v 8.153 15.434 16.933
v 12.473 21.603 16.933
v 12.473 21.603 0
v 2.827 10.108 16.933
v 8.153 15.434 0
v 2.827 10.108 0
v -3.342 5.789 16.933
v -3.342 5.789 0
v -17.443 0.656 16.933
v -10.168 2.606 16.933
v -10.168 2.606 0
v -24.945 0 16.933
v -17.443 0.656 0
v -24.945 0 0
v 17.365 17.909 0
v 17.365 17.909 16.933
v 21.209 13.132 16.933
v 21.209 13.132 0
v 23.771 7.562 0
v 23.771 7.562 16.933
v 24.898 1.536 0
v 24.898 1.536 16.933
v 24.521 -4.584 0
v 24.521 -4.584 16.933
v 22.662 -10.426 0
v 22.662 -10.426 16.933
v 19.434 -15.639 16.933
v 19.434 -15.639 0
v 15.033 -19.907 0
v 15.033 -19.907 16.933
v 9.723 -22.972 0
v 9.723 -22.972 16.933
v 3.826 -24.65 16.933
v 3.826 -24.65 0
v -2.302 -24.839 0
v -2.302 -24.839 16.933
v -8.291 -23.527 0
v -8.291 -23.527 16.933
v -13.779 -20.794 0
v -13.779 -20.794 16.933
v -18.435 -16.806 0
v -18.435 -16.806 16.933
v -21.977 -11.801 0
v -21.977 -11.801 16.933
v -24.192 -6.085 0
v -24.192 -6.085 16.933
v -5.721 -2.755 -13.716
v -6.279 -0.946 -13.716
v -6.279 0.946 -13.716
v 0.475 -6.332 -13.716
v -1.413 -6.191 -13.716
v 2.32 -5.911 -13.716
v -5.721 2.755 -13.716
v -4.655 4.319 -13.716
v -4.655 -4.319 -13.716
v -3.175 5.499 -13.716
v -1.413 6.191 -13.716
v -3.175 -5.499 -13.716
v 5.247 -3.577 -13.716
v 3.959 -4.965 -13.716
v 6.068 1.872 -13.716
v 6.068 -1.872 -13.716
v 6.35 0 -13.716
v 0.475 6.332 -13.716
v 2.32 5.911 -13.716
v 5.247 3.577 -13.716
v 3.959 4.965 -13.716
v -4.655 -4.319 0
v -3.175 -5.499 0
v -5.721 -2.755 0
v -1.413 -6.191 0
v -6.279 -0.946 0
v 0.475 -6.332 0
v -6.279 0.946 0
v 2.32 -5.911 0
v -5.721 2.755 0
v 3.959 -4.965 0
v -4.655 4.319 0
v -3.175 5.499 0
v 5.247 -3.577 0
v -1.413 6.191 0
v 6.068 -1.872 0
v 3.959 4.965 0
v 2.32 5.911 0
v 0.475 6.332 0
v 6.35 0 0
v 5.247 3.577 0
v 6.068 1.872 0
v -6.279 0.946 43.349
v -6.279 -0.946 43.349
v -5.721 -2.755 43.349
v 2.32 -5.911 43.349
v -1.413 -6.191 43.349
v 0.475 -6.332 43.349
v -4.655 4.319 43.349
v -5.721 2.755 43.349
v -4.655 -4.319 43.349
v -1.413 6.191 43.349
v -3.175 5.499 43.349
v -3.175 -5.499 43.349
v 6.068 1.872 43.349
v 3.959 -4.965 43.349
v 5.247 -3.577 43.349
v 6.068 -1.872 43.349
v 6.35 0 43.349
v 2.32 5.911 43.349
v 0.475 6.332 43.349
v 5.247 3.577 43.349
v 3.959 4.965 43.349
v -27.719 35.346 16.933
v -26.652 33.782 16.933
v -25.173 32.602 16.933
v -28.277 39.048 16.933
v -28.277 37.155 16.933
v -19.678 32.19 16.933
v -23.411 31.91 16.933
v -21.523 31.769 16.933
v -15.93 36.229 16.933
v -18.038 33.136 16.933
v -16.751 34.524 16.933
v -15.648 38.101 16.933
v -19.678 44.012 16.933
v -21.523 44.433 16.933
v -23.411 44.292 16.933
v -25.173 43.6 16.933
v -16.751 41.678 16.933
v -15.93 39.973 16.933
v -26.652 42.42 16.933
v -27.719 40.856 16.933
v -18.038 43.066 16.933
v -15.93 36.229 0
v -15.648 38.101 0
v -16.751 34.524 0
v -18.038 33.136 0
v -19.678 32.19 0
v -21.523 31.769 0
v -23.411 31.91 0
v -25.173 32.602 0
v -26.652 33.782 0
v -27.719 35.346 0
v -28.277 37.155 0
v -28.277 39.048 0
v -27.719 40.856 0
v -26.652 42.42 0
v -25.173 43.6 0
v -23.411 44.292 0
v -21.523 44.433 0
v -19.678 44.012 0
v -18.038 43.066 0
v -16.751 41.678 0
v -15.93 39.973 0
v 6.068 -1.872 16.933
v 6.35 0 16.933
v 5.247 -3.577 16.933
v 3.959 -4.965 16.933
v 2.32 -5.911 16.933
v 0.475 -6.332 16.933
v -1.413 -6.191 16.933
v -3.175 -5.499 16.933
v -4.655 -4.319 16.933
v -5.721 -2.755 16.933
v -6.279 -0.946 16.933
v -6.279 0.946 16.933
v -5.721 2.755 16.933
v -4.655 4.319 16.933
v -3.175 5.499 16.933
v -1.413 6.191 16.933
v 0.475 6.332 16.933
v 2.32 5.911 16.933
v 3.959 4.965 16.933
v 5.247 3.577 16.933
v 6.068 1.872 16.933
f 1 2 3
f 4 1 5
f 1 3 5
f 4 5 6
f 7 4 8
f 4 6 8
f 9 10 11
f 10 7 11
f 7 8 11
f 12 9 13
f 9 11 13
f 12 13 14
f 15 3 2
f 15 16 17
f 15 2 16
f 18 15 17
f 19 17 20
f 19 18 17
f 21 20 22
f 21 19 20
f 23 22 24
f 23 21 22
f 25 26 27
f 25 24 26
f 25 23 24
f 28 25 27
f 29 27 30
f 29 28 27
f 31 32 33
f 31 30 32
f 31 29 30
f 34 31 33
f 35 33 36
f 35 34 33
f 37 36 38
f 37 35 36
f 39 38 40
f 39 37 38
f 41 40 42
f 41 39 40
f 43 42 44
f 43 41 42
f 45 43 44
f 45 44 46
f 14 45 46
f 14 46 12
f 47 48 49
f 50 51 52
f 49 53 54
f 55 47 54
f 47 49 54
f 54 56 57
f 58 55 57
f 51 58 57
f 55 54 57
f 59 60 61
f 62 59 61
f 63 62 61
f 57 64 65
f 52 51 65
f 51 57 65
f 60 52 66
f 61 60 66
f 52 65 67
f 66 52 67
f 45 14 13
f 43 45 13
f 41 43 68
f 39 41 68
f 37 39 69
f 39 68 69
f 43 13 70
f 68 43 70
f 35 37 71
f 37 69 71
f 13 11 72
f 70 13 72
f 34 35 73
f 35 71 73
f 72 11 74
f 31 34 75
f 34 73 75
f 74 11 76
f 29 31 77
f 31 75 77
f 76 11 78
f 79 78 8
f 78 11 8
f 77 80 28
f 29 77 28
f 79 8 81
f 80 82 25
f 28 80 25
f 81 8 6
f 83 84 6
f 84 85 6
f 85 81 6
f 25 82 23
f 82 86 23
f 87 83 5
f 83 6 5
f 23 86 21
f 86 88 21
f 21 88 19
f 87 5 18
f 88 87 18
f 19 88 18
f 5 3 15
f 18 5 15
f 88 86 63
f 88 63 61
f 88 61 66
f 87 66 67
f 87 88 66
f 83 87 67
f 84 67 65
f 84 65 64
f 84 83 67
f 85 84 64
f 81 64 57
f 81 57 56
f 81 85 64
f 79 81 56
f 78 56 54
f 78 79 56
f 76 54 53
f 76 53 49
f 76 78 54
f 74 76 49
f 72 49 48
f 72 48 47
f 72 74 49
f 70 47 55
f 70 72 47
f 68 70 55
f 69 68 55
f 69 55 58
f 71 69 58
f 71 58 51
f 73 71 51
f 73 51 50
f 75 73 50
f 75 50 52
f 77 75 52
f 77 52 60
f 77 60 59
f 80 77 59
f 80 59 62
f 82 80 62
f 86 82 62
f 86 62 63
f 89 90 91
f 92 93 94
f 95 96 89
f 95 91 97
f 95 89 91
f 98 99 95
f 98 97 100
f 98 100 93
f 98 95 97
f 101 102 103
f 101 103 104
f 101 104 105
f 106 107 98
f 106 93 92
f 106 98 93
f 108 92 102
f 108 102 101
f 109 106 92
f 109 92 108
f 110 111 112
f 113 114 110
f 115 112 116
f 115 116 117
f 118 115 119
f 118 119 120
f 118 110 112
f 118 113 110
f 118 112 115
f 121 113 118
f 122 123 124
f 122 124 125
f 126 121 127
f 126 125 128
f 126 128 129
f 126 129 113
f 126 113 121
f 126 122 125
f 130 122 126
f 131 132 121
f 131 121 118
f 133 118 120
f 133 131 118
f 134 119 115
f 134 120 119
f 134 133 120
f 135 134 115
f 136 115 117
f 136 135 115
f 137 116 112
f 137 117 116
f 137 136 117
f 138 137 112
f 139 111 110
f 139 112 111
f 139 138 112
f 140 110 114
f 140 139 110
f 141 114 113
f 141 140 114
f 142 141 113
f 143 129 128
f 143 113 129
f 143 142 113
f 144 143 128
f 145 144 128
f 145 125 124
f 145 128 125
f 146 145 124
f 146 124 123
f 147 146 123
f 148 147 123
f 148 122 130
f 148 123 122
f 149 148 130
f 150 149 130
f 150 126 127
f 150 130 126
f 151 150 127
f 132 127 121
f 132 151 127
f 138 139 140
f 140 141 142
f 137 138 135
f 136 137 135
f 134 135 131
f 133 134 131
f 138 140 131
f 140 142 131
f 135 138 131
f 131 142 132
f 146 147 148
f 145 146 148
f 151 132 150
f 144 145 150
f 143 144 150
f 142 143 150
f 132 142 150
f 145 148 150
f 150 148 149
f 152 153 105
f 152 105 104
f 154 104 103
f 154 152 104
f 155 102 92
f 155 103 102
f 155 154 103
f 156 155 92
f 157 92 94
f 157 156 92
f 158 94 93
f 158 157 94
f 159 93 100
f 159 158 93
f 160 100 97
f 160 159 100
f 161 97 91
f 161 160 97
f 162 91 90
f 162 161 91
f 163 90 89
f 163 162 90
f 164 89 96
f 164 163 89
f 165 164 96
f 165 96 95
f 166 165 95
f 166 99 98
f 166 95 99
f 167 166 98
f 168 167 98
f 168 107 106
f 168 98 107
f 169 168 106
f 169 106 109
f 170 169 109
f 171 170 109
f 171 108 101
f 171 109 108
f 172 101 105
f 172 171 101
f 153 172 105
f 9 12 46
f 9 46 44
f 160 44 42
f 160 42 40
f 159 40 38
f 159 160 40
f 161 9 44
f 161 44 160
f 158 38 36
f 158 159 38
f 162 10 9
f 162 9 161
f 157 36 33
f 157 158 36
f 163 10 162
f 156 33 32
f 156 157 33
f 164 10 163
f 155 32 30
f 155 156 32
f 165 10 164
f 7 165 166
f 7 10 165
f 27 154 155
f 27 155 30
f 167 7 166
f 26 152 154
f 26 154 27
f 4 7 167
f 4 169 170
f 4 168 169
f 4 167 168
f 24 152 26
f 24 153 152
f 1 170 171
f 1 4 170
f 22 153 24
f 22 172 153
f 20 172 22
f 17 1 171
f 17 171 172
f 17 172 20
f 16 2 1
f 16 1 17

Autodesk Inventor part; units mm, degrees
ref_plane "YZ Plane" through (0, 0, 0) normal (1, 0, 0) x (0, 1, 0)
ref_plane "XZ Plane" through (0, 0, 0) normal (0, 1, 0) x (-1, 0, 0)
ref_plane "XY Plane" through (0, 0, 0) normal (0, 0, 1) x (1, 0, 0)
sketch "Sketch1" plane through (0, 0, 0) normal (0, 0, 1) x (1, 0, 0)
  line L0 (0, 0) -> (-87.9881, 0) construction
  line L1 (-87.9881, 0) -> (-21.9976, 38.1011) construction
  line L2 (-21.9976, 38.1011) -> (0, 0) construction
  arc A0 (-24.9453, 0) -> (12.4727, 21.6033) centre (0, 0) ccw
  line L3 (-24.9453, 0) -> (-24.9453, 43.2067) construction
  line L4 (-24.9453, 43.2067) -> (-21.9976, 38.1011) construction
  circle A1 centre (-21.9976, 38.1011) radius 6.35
  arc A2 (-24.9453, 0) -> (12.4727, 21.6033) centre (-24.9453, 43.2067) ccw
  dimension "d8" = 87.9881
  dimension "d9" = 43.9953
  dimension "d10" = 76.2
  dimension "d11" = 24.9453
  dimension "d12" = 12.7
extrude "Extrusion1" add sketch "Sketch1" along normal blind 16.9333
sketch "Sketch3" plane through (0, 0, 16.9333) normal (0, 0, 1) x (1, 0, 0)
  arc A0 (-24.9453, 0) -> (12.4727, 21.6033) centre (0, 0) ccw projected
  arc A1 (-24.9453, 0) -> (12.4727, 21.6033) centre (0, 0) ccw
  circle A2 centre (0, 0) radius 6.35
  arc A3 (-24.9453, 0) -> (12.4727, 21.6033) centre (-24.9453, 43.2067) ccw projected
  dimension "d30" = 12.7
extrude "Extrusion3" add sketch "Sketch3" along normal blind 26.416 and the other way blind 30.6493 contours A2
sketch "Sketch4" plane through (0, 0, 43.3493) normal (0, 0, 1) x (1, 0, 0)
  circle A0 centre (0, 0) radius 6.35 projected
  line L0 (0, 6.35) -> (5.4993, -3.175)
  line L1 (5.4993, -3.175) -> (-5.4993, -3.175)
  line L2 (-5.4993, -3.175) -> (0, 6.35)
  point P0 (0, 0)
  point P1 (0, 0)
properties part number "Geneva Drive"
